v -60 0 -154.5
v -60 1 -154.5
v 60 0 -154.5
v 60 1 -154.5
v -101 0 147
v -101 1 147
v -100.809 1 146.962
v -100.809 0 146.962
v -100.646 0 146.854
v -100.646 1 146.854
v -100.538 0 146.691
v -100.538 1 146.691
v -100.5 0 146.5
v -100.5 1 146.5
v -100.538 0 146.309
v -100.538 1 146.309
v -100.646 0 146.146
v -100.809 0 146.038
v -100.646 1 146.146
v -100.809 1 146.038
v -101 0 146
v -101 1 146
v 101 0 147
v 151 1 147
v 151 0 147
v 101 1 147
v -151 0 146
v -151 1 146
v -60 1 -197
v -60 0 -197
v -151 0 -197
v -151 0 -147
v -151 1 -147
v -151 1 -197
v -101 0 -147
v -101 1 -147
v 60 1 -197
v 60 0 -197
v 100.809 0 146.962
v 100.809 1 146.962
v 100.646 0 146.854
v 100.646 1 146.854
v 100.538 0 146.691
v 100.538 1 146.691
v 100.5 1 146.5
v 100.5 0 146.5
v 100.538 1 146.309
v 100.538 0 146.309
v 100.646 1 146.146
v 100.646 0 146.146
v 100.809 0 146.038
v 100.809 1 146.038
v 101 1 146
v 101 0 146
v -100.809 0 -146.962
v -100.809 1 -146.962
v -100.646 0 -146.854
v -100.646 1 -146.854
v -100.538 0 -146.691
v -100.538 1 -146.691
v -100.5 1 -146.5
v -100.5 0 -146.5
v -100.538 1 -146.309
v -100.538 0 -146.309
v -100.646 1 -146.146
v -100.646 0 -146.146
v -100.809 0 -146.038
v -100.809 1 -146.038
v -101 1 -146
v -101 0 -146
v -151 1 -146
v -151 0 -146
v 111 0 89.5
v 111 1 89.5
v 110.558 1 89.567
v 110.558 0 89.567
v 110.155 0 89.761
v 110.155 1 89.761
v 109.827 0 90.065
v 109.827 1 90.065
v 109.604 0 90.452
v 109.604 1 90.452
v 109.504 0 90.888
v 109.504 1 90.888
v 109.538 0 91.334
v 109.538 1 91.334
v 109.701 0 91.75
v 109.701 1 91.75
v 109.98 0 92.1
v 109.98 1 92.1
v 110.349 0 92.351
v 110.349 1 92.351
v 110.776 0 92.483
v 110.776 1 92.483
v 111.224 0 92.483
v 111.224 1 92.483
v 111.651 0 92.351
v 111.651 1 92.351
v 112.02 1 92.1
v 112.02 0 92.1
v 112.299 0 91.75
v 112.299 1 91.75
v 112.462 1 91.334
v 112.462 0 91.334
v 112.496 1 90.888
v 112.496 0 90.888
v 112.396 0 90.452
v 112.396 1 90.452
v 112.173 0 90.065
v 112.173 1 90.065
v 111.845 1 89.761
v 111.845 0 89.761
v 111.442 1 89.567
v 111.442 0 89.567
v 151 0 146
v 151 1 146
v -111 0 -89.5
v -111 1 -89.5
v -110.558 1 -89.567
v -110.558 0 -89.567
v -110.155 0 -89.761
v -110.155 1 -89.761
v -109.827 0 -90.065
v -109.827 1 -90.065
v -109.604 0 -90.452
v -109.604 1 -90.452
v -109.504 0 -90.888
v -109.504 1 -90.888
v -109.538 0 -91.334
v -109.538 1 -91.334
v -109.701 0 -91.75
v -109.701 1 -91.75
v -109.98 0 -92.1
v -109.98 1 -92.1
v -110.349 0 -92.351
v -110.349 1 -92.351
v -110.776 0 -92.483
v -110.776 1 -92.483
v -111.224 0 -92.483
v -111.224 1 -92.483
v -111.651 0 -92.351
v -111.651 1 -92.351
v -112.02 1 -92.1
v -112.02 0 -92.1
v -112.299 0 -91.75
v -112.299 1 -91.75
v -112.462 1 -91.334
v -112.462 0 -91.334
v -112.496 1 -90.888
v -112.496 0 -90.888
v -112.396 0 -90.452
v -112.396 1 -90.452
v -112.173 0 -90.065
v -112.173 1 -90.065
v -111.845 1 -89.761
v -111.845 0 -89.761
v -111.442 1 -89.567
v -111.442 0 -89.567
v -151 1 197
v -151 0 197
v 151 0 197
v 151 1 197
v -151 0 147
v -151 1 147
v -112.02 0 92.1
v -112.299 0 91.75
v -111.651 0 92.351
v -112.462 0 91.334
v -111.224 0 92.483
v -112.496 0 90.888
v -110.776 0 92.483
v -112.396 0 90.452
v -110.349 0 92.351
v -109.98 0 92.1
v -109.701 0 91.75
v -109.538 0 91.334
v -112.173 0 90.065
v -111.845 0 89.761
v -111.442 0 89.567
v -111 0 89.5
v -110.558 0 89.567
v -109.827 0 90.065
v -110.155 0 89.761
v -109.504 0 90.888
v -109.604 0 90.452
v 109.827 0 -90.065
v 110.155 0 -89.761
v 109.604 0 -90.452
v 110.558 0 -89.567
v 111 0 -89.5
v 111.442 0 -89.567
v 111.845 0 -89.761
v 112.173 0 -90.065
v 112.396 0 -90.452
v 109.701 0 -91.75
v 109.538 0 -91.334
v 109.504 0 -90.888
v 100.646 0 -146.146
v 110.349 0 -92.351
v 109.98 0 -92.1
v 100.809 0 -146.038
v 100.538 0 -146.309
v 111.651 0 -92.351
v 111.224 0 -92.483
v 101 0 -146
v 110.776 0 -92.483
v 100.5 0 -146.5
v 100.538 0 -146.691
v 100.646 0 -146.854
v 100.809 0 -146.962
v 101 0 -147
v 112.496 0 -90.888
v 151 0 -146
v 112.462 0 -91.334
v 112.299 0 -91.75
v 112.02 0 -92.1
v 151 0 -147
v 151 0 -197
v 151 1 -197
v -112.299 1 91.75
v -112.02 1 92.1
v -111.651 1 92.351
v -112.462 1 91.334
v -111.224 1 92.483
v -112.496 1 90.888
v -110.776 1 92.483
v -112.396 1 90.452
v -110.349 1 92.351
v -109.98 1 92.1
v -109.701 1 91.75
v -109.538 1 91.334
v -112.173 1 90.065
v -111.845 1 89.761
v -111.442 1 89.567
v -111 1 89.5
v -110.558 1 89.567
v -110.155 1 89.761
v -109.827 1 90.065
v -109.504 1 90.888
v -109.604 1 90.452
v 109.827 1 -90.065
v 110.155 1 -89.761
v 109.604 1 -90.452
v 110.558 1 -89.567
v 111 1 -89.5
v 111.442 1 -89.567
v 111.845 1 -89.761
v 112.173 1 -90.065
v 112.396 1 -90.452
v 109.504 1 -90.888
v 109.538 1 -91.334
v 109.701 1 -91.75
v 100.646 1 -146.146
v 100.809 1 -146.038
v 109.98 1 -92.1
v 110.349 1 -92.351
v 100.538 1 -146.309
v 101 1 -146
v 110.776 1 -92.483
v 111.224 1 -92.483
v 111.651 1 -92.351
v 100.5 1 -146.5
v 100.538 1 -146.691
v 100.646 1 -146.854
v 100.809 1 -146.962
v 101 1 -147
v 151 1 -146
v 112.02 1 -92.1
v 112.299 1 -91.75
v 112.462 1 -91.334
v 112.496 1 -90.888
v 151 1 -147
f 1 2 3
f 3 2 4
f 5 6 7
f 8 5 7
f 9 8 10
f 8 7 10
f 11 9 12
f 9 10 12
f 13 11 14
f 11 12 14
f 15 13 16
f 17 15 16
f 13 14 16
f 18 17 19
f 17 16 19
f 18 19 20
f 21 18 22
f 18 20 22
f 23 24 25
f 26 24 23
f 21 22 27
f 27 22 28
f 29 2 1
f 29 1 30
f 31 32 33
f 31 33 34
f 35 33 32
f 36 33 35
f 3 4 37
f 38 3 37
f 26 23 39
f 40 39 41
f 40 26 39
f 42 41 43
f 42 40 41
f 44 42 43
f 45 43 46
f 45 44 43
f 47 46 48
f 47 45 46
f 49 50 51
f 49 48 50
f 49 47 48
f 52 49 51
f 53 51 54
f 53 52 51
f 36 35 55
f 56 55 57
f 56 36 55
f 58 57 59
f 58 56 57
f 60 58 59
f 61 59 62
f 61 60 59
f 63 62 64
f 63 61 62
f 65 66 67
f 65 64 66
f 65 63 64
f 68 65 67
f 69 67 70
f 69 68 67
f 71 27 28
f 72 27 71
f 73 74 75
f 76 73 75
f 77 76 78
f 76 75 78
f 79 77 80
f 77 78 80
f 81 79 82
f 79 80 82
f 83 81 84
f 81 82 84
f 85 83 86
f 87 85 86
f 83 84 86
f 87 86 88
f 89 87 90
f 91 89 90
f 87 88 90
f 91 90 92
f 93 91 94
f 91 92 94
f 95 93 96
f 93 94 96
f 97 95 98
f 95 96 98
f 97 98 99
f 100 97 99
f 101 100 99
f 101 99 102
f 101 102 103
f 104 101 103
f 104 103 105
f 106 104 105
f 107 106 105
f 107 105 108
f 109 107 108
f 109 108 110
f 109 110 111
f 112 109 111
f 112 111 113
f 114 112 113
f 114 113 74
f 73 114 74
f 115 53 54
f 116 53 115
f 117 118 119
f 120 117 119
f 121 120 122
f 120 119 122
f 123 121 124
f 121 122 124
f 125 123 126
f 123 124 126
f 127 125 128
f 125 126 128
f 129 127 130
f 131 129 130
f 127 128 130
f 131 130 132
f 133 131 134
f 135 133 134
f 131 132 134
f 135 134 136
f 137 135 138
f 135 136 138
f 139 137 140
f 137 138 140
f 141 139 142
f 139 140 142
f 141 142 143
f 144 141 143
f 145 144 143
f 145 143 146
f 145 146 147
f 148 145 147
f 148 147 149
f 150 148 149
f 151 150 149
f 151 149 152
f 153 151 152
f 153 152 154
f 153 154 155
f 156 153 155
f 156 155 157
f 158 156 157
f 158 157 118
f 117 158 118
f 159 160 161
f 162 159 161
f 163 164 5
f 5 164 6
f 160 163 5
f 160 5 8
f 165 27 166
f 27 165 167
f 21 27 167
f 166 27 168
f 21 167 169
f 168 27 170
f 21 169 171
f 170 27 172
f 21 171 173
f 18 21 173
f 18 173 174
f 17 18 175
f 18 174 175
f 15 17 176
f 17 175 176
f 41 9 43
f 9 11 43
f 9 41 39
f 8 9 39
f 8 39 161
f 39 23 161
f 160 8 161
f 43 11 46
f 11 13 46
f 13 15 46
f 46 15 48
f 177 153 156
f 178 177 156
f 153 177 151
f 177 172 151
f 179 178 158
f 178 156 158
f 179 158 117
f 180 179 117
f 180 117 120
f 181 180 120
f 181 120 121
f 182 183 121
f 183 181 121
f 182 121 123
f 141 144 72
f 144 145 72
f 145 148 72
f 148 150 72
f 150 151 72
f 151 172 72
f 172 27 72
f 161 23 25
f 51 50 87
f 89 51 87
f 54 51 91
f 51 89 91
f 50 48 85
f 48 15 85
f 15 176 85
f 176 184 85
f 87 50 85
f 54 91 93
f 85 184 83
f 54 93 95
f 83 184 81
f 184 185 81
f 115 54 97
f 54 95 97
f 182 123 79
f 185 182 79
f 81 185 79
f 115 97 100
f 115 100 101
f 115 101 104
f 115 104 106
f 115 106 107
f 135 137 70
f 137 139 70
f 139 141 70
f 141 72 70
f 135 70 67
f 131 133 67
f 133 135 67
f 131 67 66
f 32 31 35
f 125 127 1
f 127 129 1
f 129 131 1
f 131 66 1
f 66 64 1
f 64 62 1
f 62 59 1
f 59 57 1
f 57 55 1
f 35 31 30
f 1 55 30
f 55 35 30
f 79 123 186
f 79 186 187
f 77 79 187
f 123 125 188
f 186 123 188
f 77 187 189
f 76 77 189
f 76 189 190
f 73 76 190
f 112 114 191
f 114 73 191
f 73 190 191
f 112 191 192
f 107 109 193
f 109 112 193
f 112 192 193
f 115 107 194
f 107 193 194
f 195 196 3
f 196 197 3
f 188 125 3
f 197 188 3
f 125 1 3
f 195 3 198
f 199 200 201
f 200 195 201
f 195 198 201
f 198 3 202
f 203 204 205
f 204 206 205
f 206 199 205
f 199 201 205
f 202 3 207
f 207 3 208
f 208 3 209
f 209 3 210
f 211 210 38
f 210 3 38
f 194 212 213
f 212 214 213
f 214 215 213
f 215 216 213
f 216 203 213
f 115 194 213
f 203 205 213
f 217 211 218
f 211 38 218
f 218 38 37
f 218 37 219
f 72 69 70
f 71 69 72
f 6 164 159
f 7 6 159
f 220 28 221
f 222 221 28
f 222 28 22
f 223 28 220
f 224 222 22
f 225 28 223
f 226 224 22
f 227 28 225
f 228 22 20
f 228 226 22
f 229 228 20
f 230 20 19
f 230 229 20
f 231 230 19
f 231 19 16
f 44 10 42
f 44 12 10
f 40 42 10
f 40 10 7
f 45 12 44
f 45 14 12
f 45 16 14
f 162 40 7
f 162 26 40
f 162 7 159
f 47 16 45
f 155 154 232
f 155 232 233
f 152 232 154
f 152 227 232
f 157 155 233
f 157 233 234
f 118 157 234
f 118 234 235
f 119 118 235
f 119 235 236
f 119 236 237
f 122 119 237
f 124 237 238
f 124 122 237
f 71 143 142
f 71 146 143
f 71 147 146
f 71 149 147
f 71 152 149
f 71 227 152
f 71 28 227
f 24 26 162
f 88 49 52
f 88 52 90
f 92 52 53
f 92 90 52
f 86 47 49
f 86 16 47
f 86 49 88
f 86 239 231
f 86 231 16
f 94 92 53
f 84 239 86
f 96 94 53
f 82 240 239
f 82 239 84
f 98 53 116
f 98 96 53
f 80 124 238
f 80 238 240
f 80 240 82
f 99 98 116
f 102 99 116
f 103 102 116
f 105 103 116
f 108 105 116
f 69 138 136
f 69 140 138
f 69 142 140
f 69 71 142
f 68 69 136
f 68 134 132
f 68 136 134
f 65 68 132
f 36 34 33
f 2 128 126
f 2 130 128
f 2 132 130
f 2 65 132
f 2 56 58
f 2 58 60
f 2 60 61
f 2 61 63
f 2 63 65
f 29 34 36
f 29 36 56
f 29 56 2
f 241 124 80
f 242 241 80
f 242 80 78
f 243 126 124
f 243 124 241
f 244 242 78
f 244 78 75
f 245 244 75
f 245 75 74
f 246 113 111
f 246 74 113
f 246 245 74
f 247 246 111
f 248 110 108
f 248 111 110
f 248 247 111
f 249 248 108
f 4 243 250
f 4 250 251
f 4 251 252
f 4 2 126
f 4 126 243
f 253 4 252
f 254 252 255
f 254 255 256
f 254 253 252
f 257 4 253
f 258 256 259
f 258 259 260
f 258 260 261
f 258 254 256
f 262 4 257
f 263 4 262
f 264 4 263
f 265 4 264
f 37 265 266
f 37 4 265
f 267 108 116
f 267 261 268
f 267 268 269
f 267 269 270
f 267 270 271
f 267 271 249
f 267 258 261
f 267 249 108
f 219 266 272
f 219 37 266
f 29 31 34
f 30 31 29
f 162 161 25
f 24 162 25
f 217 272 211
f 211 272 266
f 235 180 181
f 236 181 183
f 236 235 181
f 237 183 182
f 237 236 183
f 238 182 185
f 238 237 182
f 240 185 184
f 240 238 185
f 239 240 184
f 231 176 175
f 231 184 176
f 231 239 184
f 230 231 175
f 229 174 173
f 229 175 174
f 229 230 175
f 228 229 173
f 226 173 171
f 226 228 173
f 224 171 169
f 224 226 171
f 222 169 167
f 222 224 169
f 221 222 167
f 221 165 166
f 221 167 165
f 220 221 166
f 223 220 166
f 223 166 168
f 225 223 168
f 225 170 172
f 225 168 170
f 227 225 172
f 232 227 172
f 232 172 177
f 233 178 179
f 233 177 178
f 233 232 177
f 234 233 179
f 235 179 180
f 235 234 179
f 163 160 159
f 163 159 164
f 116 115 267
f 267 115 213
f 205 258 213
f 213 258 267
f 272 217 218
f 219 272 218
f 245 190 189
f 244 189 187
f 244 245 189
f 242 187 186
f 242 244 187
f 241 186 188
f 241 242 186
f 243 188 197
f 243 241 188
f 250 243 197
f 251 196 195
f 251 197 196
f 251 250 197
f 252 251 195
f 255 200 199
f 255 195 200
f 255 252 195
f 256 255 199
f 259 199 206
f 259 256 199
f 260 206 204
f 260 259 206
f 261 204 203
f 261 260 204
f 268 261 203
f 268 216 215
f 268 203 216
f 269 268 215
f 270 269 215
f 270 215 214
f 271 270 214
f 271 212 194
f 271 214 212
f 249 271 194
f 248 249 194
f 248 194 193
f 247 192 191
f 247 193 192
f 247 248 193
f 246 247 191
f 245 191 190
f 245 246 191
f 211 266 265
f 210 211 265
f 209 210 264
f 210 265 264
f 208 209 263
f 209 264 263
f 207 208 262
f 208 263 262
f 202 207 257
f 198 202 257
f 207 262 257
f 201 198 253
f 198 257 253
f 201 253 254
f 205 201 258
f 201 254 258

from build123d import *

# Parameters (mm, degrees)
SKETCH1_W               = 302
SKETCH1_H               = 394
BOSS_EXTRUDE1_DEPTH     = 1
CUT_EXTRUDE2_DEPTH      = 249.215632062
MIRROR2_COPY_1_DEPTH    = 249.215632062
SKETCH4_R               = 1.5
CUT_EXTRUDE3_DEPTH      = 249.215632062
MIRROR4_COPY_1_SKETCH_R = 1.5
MIRROR4_COPY_1_DEPTH    = 249.215632062
SKETCH5_W               = 120
SKETCH5_H               = 42.5
CUT_EXTRUDE4_DEPTH      = 249.215632062


with BuildPart() as part:
    # Sketch1 → Boss-Extrude1 (new body)
    with BuildSketch(Plane(origin=(0, 0, 0), x_dir=(1, 0, 0), z_dir=(0, 1, 0))):
        Rectangle(SKETCH1_W, SKETCH1_H)
    extrude(amount=BOSS_EXTRUDE1_DEPTH)

    # Sketch3 → Cut-Extrude2 (cut, through all)
    with BuildSketch(Plane(origin=(0, 1, 0), x_dir=(1, 0, 0), z_dir=(0, 1, 0))):
        with BuildLine():
            Line((-151, 147), (-101, 147))
            ThreePointArc((-101, 147), (-100.5, 146.5), (-101, 146))
            Line((-101, 146), (-151, 146))
            ThreePointArc((-151, 146), (-151.5, 146.5), (-151, 147))
        make_face()
    cut_extrude2 = extrude(amount=-CUT_EXTRUDE2_DEPTH, mode=Mode.SUBTRACT)

    # Mirror1: Cut-Extrude2 across plane
    add(cut_extrude2.mirror(Plane.XY), mode=Mode.SUBTRACT)

    # Mirror2: Cut-Extrude2 across plane
    add(cut_extrude2.mirror(Plane(origin=(0, 0, 0), x_dir=(0, 0, 1), z_dir=(1, 0, 0))), mode=Mode.SUBTRACT)

    # Mirror2 copy 1 sketch → Mirror2 copy 1 (cut, through all)
    with BuildSketch(Plane(origin=(0, 1, 0), x_dir=(-1, 0, 0), z_dir=(0, 1, 0))):
        with BuildLine():
            Line((-151, 147), (-101, 147))
            ThreePointArc((-101, 147), (-100.5, 146.5), (-101, 146))
            Line((-101, 146), (-151, 146))
            ThreePointArc((-151, 146), (-151.5, 146.5), (-151, 147))
        make_face()
    extrude(amount=-MIRROR2_COPY_1_DEPTH, mode=Mode.SUBTRACT)

    # Sketch4 → Cut-Extrude3 (cut, through all)
    with BuildSketch(Plane(origin=(0, 1, 0), x_dir=(1, 0, 0), z_dir=(0, 1, 0))):
        with Locations(Location((-111, 91, 0), (0, 0, 270))):
            Circle(SKETCH4_R)
    cut_extrude3 = extrude(amount=-CUT_EXTRUDE3_DEPTH, mode=Mode.SUBTRACT)

    # Mirror3: Cut-Extrude3 across plane
    add(cut_extrude3.mirror(Plane(origin=(0, 0, 0), x_dir=(0, 0, 1), z_dir=(1, 0, 0))), mode=Mode.SUBTRACT)

    # Mirror4: Cut-Extrude3 across plane
    add(cut_extrude3.mirror(Plane.XY), mode=Mode.SUBTRACT)

    # Mirror4 copy 1 sketch → Mirror4 copy 1 (cut, through all)
    with BuildSketch(Plane(origin=(0, 1, 0), x_dir=(-1, 0, 0), z_dir=(0, 1, 0))):
        with Locations(Location((-111, 91, 0), (0, 0, 270))):
            Circle(MIRROR4_COPY_1_SKETCH_R)
    extrude(amount=-MIRROR4_COPY_1_DEPTH, mode=Mode.SUBTRACT)

    # Sketch5 → Cut-Extrude4 (cut, through all)
    with BuildSketch(Plane(origin=(0, 1, 0), x_dir=(1, 0, 0), z_dir=(0, 1, 0))):
        with Locations((0, 175.75)):
            Rectangle(SKETCH5_W, SKETCH5_H)
    extrude(amount=-CUT_EXTRUDE4_DEPTH, mode=Mode.SUBTRACT)


solid = part.part
